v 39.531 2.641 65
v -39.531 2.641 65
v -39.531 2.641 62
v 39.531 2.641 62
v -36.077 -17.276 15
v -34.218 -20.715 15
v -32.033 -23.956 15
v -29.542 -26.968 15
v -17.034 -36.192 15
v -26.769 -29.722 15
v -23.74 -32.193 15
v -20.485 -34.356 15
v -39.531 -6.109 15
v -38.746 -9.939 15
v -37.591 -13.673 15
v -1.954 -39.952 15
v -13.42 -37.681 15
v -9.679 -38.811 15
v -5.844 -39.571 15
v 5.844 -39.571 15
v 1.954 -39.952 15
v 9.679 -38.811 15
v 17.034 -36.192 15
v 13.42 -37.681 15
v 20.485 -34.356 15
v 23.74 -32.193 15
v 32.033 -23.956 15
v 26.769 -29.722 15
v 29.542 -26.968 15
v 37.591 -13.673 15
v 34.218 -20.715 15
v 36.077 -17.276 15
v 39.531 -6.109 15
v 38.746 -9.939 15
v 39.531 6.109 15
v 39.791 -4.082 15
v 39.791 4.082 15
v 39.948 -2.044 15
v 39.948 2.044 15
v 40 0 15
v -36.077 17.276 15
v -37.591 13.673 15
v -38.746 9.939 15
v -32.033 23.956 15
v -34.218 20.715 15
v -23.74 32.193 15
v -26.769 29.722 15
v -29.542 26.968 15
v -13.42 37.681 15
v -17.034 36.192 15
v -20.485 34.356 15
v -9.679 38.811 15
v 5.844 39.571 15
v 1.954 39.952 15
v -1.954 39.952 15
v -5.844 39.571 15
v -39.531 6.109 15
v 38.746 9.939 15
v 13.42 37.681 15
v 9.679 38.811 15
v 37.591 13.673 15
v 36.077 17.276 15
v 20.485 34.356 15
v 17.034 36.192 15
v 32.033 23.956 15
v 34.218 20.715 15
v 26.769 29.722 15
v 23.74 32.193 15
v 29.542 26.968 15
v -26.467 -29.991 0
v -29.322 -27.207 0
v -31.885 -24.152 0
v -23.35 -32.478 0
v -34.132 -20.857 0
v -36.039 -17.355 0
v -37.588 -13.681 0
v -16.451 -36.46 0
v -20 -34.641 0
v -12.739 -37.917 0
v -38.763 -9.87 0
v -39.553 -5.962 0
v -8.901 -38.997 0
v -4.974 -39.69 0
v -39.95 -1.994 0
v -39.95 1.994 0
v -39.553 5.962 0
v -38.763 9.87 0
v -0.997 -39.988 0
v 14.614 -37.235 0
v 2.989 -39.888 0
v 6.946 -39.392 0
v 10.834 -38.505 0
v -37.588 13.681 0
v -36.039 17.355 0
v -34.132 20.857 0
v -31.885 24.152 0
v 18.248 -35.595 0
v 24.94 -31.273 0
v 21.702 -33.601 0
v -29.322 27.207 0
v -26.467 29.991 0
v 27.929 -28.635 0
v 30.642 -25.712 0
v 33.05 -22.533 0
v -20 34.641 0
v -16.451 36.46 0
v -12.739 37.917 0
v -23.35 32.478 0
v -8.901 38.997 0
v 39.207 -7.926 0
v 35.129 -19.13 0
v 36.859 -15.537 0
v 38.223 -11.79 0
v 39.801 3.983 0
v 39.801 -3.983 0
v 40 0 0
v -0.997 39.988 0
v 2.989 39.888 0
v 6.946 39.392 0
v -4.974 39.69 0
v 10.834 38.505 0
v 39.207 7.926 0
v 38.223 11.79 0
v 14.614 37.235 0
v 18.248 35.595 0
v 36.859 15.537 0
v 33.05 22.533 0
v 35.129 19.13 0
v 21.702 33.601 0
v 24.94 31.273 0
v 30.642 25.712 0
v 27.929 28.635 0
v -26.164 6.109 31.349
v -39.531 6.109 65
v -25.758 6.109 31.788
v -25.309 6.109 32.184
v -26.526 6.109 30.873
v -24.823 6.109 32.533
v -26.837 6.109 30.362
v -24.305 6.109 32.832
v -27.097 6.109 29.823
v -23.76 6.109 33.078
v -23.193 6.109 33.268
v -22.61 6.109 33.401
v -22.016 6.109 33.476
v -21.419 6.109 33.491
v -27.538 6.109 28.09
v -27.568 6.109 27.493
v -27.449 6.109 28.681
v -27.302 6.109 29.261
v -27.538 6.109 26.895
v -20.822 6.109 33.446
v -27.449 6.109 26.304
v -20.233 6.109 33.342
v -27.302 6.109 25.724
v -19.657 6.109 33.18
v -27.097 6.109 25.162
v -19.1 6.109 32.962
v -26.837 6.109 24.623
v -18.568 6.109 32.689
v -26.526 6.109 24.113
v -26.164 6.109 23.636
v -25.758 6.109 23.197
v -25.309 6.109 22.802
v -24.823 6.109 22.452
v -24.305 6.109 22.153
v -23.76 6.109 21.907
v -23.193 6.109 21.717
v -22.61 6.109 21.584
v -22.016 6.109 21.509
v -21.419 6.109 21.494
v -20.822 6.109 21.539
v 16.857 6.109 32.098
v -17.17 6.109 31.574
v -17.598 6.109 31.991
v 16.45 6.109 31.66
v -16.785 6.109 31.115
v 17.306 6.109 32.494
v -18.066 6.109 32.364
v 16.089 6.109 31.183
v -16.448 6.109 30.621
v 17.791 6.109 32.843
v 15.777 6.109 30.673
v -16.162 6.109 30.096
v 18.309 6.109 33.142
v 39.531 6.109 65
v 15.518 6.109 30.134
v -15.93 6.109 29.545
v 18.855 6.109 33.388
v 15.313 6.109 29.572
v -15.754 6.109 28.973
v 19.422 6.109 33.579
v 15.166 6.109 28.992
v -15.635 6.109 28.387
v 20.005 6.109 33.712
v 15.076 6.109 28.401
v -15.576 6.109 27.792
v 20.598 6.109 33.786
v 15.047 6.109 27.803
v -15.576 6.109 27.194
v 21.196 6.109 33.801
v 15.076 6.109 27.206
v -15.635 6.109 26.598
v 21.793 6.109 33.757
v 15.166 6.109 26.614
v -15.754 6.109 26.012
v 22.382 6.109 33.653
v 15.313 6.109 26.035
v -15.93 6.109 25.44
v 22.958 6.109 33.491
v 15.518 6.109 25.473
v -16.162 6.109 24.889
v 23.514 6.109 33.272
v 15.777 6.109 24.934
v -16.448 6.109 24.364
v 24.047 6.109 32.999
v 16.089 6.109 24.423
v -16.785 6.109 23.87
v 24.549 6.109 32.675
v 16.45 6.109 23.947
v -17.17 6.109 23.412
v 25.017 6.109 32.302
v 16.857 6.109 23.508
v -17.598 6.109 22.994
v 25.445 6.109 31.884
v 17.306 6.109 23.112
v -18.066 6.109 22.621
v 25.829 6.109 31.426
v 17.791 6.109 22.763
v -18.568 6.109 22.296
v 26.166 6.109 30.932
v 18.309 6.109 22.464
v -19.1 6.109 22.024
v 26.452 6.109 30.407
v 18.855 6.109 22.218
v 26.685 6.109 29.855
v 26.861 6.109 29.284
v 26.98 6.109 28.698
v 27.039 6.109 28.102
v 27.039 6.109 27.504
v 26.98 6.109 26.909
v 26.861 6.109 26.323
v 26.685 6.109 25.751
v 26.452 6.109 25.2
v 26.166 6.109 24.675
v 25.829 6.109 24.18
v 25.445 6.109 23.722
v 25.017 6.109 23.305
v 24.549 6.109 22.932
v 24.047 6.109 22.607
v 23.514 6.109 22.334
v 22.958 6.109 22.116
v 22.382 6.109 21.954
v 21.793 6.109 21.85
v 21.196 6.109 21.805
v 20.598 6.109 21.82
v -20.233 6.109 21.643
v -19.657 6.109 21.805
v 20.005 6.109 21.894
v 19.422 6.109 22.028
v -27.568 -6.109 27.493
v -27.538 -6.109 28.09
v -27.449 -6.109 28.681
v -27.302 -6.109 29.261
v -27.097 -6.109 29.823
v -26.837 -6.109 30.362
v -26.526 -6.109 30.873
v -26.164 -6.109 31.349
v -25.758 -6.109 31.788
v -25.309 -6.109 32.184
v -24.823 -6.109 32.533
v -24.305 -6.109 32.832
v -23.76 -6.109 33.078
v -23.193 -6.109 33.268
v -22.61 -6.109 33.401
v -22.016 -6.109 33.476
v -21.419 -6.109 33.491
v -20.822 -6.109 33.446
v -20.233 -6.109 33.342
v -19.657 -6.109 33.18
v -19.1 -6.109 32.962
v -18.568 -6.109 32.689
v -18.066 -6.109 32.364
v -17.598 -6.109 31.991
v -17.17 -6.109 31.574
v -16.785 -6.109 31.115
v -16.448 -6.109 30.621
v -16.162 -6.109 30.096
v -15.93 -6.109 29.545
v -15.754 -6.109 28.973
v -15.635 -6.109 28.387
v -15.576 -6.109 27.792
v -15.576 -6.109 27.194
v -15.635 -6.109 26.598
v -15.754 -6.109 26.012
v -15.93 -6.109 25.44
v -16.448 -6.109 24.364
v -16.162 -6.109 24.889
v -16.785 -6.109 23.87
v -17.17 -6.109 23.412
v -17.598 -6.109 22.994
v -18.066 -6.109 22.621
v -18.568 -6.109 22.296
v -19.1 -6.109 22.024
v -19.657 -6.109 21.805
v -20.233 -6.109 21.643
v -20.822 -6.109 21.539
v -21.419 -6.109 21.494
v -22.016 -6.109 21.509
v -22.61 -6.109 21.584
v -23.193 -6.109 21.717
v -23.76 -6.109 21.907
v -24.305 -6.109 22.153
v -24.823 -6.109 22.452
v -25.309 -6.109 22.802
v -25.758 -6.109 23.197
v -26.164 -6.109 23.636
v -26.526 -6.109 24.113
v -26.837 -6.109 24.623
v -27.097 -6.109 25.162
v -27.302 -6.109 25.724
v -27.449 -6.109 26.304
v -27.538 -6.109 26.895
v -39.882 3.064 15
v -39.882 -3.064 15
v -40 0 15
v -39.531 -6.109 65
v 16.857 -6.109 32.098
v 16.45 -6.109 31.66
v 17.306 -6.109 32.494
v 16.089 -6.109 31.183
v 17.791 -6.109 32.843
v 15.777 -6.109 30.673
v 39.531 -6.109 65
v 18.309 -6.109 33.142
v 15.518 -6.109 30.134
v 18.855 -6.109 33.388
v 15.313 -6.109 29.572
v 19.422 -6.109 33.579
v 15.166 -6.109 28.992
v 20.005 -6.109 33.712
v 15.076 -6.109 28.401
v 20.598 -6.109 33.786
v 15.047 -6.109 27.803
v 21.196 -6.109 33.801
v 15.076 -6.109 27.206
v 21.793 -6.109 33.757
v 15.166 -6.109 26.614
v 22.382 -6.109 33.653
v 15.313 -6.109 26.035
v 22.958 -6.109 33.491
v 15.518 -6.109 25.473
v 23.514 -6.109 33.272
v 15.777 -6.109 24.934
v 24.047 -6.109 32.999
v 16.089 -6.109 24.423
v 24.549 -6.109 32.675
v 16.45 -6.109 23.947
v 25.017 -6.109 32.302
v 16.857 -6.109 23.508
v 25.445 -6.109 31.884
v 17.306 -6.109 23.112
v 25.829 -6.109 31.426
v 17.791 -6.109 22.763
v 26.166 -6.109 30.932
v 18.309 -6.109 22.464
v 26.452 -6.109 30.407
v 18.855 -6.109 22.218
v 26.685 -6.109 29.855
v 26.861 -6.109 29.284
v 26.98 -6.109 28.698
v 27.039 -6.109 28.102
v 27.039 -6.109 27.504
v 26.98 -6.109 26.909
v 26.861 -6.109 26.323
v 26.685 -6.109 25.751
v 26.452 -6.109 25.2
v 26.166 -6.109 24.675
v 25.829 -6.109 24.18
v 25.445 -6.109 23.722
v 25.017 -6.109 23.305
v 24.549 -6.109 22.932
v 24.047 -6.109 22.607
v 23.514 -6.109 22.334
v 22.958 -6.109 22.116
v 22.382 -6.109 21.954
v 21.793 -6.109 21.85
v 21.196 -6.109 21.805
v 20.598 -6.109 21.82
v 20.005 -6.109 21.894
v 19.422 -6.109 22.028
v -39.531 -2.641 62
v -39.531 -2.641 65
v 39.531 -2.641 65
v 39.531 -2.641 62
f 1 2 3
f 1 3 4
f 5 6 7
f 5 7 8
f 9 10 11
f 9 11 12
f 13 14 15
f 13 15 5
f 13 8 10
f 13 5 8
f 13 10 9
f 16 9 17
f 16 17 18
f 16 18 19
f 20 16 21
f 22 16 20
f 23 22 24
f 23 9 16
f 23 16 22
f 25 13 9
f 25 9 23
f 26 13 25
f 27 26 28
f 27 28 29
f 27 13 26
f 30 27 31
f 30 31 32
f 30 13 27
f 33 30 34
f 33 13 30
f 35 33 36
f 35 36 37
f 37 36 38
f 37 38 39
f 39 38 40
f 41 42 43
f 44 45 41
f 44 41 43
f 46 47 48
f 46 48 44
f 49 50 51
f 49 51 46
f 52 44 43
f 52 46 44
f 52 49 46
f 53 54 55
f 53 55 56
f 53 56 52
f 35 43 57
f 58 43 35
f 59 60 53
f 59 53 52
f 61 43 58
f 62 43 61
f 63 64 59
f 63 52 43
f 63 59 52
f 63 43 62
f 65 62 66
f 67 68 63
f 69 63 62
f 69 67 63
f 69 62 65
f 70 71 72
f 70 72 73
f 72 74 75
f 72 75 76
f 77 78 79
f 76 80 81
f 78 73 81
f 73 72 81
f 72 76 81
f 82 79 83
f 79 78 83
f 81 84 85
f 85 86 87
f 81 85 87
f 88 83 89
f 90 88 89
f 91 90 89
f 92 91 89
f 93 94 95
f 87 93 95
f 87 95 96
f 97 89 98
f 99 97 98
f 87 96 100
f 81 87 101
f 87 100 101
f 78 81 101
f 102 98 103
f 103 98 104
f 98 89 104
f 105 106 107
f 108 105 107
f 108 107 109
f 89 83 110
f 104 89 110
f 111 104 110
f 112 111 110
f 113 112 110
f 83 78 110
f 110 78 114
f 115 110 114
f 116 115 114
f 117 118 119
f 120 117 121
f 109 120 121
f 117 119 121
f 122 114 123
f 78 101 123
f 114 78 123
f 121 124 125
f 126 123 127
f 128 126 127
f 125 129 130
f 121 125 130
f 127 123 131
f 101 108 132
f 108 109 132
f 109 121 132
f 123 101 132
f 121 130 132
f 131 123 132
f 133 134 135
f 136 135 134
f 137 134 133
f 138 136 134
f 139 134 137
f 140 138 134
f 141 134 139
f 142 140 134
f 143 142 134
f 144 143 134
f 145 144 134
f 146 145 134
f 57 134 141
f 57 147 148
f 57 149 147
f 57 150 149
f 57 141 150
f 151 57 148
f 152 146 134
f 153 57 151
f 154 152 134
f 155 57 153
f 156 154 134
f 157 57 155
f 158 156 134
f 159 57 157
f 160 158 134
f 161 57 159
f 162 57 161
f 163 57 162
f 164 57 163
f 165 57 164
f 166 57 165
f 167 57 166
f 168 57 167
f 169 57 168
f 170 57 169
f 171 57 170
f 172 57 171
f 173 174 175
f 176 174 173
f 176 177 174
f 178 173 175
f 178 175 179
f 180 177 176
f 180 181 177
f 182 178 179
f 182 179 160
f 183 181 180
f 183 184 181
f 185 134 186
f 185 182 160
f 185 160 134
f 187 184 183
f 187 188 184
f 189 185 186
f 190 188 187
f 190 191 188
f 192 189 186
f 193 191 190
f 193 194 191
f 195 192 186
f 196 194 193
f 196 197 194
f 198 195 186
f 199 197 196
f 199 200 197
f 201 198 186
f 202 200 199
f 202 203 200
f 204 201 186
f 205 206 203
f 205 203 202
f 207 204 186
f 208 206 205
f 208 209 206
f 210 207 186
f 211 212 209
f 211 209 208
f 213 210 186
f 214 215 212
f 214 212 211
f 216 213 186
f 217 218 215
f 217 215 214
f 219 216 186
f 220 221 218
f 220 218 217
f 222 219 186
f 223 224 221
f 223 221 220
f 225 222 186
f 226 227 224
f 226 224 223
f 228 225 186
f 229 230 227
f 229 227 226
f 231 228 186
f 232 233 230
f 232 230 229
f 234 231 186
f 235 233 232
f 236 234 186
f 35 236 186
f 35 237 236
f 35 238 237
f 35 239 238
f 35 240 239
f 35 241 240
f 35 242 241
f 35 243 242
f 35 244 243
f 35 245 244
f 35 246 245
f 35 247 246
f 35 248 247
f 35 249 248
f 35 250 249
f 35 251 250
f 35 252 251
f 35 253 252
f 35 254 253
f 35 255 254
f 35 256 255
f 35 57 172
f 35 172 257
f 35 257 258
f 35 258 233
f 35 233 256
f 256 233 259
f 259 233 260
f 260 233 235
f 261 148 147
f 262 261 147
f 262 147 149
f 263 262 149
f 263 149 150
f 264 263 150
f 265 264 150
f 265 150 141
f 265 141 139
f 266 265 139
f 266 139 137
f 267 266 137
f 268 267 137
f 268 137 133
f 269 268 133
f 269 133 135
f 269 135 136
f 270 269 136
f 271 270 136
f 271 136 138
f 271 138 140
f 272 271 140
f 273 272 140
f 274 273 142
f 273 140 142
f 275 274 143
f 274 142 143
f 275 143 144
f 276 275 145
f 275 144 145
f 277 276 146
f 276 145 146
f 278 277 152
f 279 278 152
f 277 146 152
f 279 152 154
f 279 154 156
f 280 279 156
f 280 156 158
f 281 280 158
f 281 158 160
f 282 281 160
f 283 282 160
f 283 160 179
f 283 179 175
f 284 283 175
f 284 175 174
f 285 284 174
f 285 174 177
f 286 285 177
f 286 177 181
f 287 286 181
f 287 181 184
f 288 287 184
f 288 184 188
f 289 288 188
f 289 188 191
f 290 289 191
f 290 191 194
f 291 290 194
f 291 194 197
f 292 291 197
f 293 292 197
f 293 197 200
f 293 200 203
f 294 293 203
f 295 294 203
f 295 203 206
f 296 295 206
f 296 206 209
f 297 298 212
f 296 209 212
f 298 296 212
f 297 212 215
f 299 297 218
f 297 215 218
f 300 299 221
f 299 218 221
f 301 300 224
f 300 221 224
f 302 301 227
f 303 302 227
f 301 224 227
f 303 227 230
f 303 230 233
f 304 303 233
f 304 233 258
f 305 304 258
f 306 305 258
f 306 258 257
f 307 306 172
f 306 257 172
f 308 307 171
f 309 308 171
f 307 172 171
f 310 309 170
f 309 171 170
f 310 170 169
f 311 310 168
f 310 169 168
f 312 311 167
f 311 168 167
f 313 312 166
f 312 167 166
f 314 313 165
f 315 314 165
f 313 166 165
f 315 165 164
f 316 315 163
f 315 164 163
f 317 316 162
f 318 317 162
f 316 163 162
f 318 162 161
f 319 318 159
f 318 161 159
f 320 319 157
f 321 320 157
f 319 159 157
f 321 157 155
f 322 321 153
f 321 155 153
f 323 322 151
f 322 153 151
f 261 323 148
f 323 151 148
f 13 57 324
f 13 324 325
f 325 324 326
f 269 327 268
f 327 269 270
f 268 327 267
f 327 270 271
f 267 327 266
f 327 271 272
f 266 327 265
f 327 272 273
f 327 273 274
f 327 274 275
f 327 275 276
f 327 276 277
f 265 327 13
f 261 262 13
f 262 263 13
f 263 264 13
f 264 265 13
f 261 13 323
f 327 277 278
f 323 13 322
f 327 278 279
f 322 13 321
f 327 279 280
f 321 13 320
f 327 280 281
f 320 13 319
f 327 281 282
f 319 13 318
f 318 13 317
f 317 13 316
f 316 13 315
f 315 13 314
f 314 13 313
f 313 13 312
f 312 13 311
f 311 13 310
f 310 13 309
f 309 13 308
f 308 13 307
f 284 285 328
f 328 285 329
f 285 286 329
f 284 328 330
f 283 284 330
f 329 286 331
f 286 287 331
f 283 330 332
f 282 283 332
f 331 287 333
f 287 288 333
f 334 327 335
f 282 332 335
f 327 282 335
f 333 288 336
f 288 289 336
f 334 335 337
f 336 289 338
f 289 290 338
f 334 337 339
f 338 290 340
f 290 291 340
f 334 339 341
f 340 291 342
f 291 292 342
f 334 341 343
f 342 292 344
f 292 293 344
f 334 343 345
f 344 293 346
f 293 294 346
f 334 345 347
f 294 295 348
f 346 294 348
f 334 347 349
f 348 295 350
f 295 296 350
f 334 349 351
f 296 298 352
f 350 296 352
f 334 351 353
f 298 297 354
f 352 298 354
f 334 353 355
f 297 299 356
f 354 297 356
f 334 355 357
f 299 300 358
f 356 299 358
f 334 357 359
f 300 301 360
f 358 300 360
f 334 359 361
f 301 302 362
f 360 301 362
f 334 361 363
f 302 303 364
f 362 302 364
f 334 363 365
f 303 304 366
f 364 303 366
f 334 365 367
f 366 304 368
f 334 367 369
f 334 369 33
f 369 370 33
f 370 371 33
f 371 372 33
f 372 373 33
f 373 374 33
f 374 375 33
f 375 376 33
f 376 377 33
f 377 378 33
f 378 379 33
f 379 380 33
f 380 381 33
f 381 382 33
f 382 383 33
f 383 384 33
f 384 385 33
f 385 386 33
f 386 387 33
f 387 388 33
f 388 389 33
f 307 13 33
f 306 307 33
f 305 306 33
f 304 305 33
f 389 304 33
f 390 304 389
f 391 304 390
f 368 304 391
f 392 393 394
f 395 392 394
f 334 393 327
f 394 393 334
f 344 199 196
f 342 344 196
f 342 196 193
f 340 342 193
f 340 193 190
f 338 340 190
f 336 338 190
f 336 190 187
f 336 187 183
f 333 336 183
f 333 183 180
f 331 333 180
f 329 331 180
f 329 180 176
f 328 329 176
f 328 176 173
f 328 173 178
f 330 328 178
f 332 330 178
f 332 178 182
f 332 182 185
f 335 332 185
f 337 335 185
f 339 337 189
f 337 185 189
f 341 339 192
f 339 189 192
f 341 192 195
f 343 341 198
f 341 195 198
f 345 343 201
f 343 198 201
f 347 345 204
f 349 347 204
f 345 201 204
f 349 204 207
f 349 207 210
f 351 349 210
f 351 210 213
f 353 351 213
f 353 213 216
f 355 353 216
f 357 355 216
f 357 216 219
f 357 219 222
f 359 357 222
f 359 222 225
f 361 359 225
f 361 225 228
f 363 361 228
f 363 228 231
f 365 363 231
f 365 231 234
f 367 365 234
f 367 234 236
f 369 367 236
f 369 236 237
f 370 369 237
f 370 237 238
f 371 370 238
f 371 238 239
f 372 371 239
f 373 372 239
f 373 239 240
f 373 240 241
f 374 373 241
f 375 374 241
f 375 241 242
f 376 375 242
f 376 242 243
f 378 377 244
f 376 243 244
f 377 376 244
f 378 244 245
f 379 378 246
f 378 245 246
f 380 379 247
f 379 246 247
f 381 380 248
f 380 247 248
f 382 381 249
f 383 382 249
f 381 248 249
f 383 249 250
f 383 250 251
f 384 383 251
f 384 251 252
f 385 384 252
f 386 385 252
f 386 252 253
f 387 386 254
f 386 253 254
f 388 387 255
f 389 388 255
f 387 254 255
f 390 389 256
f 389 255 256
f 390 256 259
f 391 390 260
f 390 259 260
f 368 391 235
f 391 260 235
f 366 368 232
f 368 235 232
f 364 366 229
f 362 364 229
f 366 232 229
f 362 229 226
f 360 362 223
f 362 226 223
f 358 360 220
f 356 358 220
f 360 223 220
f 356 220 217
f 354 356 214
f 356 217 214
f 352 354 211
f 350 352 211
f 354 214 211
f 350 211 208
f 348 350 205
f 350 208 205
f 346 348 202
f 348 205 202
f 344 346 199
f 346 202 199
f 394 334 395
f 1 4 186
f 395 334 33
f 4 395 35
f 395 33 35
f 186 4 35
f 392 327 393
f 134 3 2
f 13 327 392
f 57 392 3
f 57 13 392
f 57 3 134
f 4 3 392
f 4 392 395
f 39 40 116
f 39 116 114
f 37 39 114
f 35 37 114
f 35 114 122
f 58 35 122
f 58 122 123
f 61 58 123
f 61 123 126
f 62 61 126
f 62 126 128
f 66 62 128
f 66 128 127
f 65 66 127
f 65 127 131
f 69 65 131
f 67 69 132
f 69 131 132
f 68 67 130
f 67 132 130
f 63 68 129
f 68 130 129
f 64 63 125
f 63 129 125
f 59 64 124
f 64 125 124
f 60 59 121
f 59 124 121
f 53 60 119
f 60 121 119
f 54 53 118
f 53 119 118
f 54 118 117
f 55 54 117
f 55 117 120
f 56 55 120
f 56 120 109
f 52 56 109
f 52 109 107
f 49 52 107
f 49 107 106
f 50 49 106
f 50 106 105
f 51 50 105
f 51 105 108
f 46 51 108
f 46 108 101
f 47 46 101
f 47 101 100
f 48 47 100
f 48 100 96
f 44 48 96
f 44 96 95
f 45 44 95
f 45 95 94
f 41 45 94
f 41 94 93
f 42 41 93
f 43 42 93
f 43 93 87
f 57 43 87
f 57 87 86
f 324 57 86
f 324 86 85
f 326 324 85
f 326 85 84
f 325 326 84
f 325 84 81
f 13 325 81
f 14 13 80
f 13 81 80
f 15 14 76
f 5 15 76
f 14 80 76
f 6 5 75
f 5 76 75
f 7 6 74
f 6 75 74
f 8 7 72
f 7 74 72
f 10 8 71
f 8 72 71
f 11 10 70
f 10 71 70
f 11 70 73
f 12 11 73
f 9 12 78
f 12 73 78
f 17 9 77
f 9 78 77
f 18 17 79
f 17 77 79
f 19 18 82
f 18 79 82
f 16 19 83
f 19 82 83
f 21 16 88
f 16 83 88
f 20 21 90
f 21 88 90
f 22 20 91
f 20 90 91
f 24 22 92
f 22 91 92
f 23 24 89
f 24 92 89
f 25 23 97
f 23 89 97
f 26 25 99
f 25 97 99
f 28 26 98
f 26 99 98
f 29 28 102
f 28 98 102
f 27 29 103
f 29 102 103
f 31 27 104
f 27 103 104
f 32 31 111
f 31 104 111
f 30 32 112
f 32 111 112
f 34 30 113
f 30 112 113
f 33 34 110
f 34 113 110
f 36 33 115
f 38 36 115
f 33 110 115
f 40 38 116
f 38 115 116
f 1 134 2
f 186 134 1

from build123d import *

# Parameters (mm, degrees)
F0_R     = 40
F1_DEPTH = 15
F2_W     = 79.06135
F2_H     = 12.21896
F3_DEPTH = 50
F4_W     = 79.06135
F4_H     = 5.281066
F5_DEPTH = 3
F6_R     = 6
F7_DEPTH = 25


with BuildPart() as f1:
    # F0 (on Top) → F1 (new body)
    with BuildSketch(Plane.XY):
        Circle(F0_R)
    extrude(amount=F1_DEPTH)

    # F2 (on face) → F3 (join)
    with BuildSketch(Plane.XY.offset(15)):
        Rectangle(F2_W, F2_H)
    extrude(amount=F3_DEPTH)

    # F4 (on face) → F5 (cut)
    with BuildSketch(Plane.XY.offset(65)):
        Rectangle(F4_W, F4_H)
    extrude(amount=-F5_DEPTH, mode=Mode.SUBTRACT)

    # F6 (on face) → F7 (cut)
    with BuildSketch(Plane(origin=(0, 6.10948, 0), x_dir=(-1, 0, 0), z_dir=(0, 1, 0))):
        with Locations((-21.04659, 27.803255)):
            Circle(F6_R)
        with Locations((21.568101, 27.492605)):
            Circle(F6_R)
    extrude(amount=-F7_DEPTH, mode=Mode.SUBTRACT)


solid = f1.part
